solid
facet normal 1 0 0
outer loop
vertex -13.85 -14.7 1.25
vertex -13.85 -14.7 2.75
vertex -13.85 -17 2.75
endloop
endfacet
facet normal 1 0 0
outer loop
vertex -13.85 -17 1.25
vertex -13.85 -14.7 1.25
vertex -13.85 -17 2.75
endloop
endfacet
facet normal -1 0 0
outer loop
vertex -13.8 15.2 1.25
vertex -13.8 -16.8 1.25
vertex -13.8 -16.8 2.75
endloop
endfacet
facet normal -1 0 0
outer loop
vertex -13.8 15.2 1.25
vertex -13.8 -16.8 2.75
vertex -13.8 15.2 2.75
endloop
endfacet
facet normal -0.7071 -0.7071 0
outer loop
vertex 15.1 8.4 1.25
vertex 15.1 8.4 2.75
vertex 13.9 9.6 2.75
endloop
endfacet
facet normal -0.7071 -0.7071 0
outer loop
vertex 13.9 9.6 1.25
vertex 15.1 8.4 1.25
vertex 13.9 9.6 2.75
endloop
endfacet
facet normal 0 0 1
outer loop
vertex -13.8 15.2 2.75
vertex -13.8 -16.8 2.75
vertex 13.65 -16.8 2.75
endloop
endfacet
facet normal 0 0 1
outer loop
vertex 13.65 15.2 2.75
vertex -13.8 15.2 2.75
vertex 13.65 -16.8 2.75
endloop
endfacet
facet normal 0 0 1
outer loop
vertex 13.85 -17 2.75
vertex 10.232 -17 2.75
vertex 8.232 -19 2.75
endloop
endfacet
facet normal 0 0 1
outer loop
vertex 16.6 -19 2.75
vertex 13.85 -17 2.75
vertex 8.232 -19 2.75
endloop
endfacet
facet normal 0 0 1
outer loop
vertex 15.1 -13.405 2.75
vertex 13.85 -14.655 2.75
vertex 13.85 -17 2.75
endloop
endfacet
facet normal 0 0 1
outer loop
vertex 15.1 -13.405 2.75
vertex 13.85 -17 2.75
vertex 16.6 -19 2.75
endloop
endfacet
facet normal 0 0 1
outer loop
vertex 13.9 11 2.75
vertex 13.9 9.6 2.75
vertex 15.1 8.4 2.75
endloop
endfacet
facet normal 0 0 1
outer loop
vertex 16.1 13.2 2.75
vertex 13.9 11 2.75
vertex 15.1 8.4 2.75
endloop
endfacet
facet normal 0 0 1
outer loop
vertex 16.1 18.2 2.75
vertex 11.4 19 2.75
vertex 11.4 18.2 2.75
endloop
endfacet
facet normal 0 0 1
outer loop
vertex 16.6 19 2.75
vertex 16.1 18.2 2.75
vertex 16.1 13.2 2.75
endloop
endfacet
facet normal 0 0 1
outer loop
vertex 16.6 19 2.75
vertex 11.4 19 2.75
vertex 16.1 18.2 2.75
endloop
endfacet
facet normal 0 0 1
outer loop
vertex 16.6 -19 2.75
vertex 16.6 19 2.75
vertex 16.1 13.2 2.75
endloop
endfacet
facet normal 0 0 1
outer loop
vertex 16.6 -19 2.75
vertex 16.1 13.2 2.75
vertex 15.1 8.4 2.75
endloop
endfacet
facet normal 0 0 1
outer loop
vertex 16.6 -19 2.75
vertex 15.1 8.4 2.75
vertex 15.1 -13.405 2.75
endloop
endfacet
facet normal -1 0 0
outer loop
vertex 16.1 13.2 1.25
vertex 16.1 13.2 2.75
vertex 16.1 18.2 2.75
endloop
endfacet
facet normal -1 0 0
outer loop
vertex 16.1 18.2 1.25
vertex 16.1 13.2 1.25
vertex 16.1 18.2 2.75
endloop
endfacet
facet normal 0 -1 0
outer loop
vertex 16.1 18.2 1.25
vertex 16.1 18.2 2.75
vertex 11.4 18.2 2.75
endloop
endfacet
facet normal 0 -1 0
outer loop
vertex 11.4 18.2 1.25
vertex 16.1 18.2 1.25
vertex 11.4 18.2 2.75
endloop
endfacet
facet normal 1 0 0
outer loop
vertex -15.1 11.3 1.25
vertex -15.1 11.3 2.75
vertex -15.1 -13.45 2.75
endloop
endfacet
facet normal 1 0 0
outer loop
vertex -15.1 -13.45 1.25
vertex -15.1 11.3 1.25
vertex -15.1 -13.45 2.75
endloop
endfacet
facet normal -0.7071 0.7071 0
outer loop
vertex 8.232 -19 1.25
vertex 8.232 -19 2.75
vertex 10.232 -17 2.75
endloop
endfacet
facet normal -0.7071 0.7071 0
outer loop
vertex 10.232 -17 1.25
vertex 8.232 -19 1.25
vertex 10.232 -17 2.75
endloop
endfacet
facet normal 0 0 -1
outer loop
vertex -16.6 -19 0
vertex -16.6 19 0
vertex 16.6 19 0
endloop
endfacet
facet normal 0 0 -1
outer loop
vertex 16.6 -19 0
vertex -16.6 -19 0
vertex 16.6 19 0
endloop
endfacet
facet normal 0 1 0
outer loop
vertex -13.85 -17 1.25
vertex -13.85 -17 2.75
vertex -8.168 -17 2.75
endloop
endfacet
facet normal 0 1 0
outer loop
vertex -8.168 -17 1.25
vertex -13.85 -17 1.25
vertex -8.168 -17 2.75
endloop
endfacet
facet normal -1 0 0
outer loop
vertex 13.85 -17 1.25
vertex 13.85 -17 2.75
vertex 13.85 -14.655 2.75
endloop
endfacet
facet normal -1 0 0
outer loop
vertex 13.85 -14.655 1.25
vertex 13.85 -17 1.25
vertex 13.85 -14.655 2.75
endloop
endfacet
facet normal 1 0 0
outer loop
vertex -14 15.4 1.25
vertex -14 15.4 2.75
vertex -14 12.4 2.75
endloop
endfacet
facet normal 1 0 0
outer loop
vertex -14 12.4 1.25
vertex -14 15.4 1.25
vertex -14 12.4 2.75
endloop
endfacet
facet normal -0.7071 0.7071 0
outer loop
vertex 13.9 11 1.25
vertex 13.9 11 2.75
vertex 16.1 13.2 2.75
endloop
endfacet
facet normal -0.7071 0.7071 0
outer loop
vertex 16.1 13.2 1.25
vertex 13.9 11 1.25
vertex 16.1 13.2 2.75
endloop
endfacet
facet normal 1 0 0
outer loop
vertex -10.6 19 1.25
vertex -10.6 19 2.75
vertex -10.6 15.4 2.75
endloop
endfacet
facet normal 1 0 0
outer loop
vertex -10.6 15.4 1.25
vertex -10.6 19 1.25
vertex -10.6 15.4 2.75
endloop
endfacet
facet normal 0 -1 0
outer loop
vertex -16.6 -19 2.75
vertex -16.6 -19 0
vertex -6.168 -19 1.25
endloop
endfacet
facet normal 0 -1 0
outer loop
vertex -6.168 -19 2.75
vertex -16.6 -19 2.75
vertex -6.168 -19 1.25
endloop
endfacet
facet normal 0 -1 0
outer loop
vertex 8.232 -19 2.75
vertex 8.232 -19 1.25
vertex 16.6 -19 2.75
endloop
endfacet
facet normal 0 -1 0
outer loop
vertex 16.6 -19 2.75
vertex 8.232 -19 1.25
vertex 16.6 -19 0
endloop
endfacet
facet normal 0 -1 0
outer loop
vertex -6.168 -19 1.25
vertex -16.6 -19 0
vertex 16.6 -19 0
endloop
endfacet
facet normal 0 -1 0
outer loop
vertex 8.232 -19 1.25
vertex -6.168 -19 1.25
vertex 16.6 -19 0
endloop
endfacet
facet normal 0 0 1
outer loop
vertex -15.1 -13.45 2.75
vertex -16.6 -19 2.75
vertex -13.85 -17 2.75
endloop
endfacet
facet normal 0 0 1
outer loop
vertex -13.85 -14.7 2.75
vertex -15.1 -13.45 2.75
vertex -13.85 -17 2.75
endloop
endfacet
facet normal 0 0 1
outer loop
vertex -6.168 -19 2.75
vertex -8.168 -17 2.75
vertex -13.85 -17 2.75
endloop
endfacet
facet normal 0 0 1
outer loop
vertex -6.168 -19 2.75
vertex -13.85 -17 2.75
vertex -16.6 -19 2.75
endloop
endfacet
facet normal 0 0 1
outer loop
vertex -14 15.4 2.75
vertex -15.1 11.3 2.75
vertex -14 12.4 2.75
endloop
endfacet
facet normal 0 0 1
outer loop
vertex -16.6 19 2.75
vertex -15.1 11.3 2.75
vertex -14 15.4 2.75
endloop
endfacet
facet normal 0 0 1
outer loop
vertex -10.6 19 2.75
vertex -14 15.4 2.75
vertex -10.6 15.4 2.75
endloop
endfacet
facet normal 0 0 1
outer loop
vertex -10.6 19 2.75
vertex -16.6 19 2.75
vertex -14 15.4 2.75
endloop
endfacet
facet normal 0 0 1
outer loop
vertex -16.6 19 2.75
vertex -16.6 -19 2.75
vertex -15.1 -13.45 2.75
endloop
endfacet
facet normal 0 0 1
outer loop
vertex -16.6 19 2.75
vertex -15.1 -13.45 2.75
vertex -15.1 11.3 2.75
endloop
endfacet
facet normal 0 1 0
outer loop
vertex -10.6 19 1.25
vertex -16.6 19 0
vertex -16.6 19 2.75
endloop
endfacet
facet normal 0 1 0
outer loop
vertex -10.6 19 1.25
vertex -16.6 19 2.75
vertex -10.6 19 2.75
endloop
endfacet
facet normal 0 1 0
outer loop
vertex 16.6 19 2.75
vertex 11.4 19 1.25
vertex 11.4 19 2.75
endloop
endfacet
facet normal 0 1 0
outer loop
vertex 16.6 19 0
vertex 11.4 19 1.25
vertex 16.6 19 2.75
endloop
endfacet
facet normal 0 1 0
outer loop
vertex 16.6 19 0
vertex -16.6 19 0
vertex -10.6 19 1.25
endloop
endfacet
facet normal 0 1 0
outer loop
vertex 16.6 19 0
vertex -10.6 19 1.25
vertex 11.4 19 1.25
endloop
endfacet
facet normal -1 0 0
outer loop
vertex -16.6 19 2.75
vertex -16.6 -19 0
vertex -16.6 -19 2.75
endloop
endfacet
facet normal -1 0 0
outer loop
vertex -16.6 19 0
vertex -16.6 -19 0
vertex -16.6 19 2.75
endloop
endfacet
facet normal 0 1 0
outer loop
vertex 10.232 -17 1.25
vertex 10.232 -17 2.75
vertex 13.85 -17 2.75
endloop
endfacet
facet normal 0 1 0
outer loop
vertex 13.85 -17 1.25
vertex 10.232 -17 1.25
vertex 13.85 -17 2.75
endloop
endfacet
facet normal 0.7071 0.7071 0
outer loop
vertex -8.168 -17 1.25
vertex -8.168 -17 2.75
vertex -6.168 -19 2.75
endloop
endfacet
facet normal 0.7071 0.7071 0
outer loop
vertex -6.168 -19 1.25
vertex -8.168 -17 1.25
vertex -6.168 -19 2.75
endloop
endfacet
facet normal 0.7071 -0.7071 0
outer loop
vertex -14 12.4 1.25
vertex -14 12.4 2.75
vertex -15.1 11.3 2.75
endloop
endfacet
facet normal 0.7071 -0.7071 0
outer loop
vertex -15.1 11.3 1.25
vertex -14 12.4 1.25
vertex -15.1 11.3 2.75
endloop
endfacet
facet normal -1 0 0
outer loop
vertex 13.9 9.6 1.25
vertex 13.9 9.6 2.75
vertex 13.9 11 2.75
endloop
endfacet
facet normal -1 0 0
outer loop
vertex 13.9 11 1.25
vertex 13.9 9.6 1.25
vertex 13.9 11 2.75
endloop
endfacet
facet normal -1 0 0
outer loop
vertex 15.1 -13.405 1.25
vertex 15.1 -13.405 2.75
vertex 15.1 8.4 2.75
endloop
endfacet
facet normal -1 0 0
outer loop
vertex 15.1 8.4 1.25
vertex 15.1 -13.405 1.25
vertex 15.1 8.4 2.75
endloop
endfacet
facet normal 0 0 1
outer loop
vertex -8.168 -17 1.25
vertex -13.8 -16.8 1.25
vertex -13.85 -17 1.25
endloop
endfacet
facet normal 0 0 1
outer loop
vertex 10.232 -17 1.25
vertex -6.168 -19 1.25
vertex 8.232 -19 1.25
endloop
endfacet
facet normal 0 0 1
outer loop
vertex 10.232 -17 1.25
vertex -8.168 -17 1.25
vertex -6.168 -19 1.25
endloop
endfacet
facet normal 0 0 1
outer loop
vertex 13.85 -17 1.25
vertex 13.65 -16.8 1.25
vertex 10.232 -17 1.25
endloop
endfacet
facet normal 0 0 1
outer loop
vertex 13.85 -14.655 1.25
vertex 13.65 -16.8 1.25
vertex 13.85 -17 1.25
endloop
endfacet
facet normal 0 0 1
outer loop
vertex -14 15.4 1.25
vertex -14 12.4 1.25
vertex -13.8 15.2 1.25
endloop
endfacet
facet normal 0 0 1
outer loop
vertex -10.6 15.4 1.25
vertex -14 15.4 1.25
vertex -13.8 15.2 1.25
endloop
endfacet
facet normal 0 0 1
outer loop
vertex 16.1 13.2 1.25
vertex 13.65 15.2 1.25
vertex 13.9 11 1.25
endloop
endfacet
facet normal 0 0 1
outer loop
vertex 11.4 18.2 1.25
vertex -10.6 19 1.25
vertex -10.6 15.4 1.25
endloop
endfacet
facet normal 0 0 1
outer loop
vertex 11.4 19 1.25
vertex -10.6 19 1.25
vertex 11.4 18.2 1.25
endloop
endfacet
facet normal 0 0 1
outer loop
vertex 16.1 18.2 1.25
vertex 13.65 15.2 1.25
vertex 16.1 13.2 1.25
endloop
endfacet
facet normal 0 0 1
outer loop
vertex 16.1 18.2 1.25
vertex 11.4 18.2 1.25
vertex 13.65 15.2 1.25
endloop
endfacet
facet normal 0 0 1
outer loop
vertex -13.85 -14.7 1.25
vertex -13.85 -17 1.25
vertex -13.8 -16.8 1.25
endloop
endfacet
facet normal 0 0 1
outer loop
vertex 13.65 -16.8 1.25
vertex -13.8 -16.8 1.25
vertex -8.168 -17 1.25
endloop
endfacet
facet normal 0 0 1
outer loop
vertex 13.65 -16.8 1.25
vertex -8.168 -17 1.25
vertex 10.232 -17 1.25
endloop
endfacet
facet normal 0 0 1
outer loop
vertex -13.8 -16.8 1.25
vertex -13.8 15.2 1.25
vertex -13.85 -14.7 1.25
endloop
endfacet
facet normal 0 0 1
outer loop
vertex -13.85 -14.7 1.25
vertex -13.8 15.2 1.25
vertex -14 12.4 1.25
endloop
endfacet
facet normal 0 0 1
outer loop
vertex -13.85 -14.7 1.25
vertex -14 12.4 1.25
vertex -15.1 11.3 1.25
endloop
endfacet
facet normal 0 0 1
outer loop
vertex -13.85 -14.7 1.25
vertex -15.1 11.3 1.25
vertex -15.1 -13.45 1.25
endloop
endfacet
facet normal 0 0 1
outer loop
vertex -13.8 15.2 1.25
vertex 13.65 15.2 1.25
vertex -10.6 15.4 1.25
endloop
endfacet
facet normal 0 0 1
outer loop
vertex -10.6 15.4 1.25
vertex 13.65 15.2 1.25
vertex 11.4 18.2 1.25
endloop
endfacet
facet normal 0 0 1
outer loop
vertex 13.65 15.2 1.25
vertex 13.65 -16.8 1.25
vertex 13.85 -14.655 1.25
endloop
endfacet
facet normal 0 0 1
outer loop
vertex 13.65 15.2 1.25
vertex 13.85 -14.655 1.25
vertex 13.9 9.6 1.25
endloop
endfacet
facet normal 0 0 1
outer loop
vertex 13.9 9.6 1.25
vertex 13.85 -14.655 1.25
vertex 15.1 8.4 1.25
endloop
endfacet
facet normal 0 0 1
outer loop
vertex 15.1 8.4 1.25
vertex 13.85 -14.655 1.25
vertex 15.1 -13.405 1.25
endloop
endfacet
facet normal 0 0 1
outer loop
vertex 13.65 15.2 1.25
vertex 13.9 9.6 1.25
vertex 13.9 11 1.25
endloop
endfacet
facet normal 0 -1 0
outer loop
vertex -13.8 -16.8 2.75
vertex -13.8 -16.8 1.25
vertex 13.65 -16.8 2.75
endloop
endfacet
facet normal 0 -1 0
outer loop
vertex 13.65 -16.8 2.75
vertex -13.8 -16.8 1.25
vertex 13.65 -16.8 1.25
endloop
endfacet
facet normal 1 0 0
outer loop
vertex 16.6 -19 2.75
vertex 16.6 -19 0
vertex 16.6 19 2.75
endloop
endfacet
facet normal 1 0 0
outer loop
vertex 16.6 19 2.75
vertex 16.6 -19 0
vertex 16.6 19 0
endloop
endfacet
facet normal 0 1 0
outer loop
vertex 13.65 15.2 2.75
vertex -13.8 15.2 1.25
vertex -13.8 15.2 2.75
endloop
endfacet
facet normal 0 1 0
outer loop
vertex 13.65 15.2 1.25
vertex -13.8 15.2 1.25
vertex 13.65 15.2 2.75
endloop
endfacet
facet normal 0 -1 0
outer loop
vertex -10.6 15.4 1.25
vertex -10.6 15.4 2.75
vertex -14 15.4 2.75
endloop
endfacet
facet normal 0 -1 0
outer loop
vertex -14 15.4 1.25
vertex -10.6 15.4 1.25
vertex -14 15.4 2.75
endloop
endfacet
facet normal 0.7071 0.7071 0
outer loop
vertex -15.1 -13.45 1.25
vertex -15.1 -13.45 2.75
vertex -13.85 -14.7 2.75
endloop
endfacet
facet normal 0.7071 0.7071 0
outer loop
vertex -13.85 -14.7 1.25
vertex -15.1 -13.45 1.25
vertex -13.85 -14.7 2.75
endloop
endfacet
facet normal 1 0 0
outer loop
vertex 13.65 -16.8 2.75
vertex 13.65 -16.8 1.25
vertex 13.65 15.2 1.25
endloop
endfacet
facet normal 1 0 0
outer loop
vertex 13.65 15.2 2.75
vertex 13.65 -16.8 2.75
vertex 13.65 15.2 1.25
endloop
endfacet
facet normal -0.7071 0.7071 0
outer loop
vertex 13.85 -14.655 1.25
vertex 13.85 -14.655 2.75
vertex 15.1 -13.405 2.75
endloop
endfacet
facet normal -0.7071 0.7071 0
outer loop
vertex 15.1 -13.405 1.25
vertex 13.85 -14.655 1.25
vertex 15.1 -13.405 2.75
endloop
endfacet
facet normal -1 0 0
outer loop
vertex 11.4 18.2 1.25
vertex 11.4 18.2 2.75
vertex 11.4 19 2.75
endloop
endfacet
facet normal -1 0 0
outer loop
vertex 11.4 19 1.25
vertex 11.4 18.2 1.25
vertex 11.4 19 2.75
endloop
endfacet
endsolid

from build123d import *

# Parameters (mm, degrees)
SKETCH1_W           = 33.2
SKETCH1_H           = 38
BOSS_EXTRUDE1_DEPTH = 2.75
CUT_EXTRUDE1_DEPTH  = 1.5
SKETCH3_W           = 27.45
SKETCH3_H           = 32
BOSS_EXTRUDE2_DEPTH = 1.5


with BuildPart() as part:
    # Sketch1 → Boss-Extrude1 (new body)
    with BuildSketch(Plane.XY):
        Rectangle(SKETCH1_W, SKETCH1_H)
    extrude(amount=BOSS_EXTRUDE1_DEPTH)

    # Sketch2 → Cut-Extrude1 (cut)
    with BuildSketch(Plane.XY.offset(2.75)):
        Polygon((-6.16774695, -19), (8.23225305, -19), (10.23225305, -17), (13.85, -17), (13.85, -14.655424434), (15.1, -13.405424434), (15.1, 8.4), (13.9, 9.6), (13.9, 11), (16.1, 13.2), (16.1, 18.2), (11.4, 18.2), (11.4, 19), (-10.6, 19), (-10.6, 15.4), (-14, 15.4), (-14, 12.4), (-15.1, 11.3), (-15.1, -13.45), (-13.85, -14.7), (-13.85, -17), (-8.16774695, -17), align=None)
    extrude(amount=-CUT_EXTRUDE1_DEPTH, mode=Mode.SUBTRACT)

    # Sketch3 → Boss-Extrude2 (add)
    with BuildSketch(Plane.XY.offset(1.25)):
        with Locations((-0.075, -0.8)):
            Rectangle(SKETCH3_W, SKETCH3_H)
    extrude(amount=BOSS_EXTRUDE2_DEPTH)


solid = part.part
